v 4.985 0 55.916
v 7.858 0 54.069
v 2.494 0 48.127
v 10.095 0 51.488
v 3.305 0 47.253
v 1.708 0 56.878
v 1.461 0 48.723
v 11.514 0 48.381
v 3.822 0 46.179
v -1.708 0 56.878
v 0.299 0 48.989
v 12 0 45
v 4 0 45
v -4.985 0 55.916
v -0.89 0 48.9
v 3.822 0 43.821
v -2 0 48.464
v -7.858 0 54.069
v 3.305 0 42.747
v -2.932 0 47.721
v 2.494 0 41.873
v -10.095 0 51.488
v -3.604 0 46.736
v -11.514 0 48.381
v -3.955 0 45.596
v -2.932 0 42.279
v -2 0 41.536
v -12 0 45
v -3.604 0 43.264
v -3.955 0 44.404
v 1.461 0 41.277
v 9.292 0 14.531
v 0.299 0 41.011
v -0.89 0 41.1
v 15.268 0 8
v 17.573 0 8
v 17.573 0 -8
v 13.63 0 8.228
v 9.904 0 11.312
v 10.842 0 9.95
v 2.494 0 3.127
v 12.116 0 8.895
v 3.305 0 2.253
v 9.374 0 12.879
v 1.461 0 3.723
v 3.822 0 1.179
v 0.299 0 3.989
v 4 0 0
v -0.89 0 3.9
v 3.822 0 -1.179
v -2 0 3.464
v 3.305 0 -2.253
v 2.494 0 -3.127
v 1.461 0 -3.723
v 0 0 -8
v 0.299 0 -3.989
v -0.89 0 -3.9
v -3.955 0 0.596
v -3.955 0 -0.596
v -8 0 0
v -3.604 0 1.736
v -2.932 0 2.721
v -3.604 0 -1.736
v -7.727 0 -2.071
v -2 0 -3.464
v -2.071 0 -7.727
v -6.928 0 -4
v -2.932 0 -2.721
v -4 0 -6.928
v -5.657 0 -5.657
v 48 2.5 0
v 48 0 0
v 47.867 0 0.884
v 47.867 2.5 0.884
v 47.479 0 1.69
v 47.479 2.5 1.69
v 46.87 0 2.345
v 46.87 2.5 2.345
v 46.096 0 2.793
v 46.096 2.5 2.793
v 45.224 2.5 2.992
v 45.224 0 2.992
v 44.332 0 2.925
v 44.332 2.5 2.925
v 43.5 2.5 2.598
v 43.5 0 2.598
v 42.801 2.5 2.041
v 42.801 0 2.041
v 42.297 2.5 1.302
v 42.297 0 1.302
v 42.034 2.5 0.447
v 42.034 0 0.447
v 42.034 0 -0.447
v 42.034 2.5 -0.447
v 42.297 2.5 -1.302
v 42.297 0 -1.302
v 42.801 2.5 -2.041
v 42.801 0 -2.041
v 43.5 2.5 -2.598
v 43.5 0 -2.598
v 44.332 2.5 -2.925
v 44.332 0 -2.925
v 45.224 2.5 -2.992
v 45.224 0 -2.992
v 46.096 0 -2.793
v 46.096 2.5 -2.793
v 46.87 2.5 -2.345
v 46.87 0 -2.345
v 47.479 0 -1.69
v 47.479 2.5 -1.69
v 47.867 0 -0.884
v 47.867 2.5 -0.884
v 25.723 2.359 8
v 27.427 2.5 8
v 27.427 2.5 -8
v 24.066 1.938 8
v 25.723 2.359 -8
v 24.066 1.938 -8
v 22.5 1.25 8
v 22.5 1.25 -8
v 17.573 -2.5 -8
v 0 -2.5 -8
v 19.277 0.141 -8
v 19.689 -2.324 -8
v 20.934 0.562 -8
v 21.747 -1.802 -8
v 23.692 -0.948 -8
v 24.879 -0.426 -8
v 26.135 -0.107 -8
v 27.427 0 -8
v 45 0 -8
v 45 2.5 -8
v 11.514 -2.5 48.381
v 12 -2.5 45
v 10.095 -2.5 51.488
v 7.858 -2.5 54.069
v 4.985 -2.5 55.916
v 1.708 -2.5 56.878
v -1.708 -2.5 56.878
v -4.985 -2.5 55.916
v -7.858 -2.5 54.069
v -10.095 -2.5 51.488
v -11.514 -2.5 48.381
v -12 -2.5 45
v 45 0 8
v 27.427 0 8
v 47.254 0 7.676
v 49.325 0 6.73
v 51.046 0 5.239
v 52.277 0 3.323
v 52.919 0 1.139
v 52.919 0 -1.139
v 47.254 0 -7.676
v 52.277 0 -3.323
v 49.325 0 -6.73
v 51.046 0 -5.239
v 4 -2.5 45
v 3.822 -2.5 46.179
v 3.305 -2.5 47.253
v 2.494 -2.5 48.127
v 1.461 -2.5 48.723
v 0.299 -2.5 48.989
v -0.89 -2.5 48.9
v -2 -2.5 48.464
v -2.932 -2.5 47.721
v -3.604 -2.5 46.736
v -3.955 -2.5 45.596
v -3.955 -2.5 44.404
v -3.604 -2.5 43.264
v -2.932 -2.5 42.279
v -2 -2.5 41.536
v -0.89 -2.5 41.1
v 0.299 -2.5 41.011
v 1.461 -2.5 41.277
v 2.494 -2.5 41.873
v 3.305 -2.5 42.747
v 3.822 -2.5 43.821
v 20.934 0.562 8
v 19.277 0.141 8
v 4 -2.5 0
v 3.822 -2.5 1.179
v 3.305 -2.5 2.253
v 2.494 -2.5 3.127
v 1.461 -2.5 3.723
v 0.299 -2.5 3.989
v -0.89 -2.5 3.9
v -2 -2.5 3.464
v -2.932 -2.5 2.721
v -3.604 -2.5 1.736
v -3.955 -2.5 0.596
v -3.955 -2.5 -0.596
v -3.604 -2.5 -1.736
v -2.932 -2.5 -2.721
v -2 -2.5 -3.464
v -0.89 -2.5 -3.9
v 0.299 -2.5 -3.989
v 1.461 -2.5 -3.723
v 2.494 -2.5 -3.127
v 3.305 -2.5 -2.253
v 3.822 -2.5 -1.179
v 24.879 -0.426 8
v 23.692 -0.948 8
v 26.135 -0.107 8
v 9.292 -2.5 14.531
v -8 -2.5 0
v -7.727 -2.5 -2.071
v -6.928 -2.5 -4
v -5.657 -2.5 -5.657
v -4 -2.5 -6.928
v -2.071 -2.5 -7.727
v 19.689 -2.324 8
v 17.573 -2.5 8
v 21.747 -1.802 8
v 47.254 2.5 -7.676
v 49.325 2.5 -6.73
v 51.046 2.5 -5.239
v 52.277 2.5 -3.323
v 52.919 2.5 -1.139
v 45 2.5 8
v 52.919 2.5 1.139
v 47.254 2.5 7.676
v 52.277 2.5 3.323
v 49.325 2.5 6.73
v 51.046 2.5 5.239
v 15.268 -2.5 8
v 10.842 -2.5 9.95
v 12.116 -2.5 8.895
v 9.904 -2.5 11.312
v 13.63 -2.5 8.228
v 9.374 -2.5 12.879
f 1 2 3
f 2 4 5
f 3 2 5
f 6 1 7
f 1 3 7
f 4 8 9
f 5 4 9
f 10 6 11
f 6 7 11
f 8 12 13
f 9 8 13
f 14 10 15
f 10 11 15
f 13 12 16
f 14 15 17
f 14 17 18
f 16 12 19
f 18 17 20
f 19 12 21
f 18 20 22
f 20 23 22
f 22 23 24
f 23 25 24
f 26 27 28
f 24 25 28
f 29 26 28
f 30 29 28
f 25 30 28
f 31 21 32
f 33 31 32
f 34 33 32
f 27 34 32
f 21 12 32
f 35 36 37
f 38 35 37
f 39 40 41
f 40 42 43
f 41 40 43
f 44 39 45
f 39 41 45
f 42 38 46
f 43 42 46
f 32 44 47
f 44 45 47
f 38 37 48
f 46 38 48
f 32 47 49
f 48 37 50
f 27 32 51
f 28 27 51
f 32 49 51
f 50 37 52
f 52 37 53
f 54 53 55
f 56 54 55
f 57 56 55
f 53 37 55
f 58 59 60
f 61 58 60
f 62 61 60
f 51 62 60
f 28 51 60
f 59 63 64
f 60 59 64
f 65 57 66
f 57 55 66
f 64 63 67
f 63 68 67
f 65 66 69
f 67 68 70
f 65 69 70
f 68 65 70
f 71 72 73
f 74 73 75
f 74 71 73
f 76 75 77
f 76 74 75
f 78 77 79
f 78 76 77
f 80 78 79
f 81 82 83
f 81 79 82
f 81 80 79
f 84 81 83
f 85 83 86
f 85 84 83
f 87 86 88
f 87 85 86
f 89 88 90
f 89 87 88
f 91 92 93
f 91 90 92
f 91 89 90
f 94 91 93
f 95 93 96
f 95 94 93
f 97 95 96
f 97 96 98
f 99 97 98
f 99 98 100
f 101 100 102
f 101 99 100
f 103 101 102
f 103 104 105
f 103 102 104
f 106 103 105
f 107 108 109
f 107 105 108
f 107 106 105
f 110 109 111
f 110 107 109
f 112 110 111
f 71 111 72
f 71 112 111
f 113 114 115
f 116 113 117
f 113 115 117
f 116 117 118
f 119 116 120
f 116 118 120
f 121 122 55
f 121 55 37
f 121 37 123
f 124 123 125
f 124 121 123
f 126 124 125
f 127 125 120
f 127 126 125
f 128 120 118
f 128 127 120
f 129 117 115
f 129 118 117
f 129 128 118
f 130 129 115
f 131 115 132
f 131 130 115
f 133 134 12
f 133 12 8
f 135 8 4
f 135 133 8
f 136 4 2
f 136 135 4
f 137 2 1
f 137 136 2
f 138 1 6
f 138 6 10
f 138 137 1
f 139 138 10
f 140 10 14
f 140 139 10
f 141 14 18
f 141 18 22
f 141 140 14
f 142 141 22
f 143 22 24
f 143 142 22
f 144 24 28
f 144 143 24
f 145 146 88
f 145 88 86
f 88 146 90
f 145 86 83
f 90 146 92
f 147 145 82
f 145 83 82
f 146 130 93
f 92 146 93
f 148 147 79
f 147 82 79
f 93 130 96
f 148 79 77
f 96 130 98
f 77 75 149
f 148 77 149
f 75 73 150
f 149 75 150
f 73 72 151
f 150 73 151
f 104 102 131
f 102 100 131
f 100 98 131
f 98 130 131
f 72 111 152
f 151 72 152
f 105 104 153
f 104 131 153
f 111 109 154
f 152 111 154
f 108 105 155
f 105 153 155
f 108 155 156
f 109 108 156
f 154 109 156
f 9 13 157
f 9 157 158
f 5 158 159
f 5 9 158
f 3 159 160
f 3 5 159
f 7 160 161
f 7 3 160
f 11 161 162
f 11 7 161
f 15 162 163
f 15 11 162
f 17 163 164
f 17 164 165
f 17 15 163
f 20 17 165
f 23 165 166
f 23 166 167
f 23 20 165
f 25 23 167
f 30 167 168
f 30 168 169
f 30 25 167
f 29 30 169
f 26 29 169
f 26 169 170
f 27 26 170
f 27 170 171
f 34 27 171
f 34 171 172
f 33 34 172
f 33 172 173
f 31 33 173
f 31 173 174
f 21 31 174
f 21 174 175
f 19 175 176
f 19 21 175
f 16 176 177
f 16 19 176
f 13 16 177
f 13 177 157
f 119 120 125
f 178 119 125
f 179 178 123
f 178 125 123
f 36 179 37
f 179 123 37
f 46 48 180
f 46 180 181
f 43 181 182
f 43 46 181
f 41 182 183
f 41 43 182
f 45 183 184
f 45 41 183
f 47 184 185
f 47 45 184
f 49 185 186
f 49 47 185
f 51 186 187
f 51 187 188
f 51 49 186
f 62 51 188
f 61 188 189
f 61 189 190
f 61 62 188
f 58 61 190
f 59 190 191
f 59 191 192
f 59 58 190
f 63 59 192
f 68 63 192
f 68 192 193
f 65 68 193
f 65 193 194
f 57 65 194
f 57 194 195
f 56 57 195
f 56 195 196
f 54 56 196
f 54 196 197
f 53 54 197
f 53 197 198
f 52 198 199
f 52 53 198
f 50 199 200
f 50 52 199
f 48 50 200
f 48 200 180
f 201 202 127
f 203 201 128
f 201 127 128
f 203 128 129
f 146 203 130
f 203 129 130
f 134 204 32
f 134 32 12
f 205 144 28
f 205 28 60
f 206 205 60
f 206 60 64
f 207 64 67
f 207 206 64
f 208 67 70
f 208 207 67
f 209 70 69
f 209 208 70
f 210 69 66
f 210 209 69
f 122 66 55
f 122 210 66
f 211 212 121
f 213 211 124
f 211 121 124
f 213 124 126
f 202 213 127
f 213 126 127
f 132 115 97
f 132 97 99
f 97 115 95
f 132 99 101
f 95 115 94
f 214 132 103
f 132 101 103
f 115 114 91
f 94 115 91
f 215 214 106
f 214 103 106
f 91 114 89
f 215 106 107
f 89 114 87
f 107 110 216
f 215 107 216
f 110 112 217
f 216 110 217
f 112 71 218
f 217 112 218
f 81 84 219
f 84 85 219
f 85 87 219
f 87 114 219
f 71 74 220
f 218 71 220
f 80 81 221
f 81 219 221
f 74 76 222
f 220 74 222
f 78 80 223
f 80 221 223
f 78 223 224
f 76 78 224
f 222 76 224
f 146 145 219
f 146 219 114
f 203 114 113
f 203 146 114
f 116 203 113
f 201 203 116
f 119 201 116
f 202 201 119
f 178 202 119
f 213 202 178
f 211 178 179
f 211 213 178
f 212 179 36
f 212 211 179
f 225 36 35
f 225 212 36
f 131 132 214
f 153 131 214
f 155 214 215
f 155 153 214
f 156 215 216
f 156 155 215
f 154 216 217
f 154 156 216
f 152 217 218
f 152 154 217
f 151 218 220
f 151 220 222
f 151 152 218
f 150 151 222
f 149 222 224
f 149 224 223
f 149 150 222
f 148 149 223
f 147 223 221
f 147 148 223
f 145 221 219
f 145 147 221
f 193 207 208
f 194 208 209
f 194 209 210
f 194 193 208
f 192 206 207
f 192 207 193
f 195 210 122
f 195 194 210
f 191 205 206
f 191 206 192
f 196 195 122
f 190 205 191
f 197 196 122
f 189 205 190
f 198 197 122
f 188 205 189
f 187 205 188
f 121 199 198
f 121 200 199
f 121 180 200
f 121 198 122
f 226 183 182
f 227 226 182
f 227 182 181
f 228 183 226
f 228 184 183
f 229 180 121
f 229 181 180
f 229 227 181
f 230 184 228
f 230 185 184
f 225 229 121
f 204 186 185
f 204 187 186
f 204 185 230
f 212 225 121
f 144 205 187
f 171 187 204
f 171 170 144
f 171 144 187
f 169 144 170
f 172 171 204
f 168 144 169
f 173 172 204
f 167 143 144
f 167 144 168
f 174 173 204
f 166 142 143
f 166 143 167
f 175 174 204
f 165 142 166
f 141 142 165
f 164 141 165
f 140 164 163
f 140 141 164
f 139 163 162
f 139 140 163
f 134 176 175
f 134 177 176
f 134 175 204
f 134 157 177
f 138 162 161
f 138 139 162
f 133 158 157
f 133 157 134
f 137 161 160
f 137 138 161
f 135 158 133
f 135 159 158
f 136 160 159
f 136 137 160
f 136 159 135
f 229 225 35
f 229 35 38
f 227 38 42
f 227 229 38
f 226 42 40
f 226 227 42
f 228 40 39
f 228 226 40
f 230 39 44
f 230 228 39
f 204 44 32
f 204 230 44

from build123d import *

# Parameters (mm, degrees)
F0_R     = 4
F0_R_2   = 3
F1_DEPTH = 2.5
F2_W     = 12
F2_H     = 2.5
F2_W_2   = 8
F3_DEPTH = 65.001


with BuildPart() as f1:
    # F0 (on Front) → F1 (new body, symmetric)
    with BuildSketch(Plane.XZ):
        with BuildLine():
            ThreePointArc((45, -8), (53, 0), (45, 8))
            Line((45, 8), (15.268102, 8))
            ThreePointArc((15.268102, 8), (10.841623, 9.949533), (9.291666, 14.531239))
            Line((9.291666, 14.531239), (12, 45))
            ThreePointArc((12, 45), (0, 57), (-12, 45))
            Line((-12, 45), (-8, 0))
            ThreePointArc((-8, 0), (-5.656854, -5.656854), (0, -8))
            Line((0, -8), (45, -8))
        make_face()
        Circle(F0_R, mode=Mode.SUBTRACT)
        with Locations((45, 0)):
            Circle(F0_R_2, mode=Mode.SUBTRACT)
        with Locations((0, 45)):
            Circle(F0_R, mode=Mode.SUBTRACT)
    extrude(amount=F1_DEPTH, both=True)

    # F2 (on face) → F3 (cut, through all)
    with BuildSketch(Plane(origin=(0, 0, -8), x_dir=(1, 0, 0), z_dir=(0, 0, -1))):
        with Locations((-6, -1.25)):
            Rectangle(F2_W, F2_H)
        with BuildLine():
            Line((17.572512, 0), (0, 0))
            Line((0, 0), (0, -2.5))
            Line((0, -2.5), (27.427488, -2.5))
            ThreePointArc((27.427488, -2.5), (24.885705, -2.182628), (22.5, -1.25))
            ThreePointArc((22.5, -1.25), (20.114295, -0.317372), (17.572512, 0))
        make_face()
        with Locations((49, 1.25)):
            Rectangle(F2_W_2, F2_H)
        with BuildLine():
            Line((45, 2.5), (17.572512, 2.5))
            ThreePointArc((17.572512, 2.5), (20.729021, 2.105872), (23.691705, 0.94769))
            ThreePointArc((23.691705, 0.94769), (25.500431, 0.240616), (27.427488, 0))
            Line((27.427488, 0), (45, 0))
            Line((45, 0), (45, 2.5))
        make_face()
    extrude(amount=-F3_DEPTH, mode=Mode.SUBTRACT)


solid = f1.part
